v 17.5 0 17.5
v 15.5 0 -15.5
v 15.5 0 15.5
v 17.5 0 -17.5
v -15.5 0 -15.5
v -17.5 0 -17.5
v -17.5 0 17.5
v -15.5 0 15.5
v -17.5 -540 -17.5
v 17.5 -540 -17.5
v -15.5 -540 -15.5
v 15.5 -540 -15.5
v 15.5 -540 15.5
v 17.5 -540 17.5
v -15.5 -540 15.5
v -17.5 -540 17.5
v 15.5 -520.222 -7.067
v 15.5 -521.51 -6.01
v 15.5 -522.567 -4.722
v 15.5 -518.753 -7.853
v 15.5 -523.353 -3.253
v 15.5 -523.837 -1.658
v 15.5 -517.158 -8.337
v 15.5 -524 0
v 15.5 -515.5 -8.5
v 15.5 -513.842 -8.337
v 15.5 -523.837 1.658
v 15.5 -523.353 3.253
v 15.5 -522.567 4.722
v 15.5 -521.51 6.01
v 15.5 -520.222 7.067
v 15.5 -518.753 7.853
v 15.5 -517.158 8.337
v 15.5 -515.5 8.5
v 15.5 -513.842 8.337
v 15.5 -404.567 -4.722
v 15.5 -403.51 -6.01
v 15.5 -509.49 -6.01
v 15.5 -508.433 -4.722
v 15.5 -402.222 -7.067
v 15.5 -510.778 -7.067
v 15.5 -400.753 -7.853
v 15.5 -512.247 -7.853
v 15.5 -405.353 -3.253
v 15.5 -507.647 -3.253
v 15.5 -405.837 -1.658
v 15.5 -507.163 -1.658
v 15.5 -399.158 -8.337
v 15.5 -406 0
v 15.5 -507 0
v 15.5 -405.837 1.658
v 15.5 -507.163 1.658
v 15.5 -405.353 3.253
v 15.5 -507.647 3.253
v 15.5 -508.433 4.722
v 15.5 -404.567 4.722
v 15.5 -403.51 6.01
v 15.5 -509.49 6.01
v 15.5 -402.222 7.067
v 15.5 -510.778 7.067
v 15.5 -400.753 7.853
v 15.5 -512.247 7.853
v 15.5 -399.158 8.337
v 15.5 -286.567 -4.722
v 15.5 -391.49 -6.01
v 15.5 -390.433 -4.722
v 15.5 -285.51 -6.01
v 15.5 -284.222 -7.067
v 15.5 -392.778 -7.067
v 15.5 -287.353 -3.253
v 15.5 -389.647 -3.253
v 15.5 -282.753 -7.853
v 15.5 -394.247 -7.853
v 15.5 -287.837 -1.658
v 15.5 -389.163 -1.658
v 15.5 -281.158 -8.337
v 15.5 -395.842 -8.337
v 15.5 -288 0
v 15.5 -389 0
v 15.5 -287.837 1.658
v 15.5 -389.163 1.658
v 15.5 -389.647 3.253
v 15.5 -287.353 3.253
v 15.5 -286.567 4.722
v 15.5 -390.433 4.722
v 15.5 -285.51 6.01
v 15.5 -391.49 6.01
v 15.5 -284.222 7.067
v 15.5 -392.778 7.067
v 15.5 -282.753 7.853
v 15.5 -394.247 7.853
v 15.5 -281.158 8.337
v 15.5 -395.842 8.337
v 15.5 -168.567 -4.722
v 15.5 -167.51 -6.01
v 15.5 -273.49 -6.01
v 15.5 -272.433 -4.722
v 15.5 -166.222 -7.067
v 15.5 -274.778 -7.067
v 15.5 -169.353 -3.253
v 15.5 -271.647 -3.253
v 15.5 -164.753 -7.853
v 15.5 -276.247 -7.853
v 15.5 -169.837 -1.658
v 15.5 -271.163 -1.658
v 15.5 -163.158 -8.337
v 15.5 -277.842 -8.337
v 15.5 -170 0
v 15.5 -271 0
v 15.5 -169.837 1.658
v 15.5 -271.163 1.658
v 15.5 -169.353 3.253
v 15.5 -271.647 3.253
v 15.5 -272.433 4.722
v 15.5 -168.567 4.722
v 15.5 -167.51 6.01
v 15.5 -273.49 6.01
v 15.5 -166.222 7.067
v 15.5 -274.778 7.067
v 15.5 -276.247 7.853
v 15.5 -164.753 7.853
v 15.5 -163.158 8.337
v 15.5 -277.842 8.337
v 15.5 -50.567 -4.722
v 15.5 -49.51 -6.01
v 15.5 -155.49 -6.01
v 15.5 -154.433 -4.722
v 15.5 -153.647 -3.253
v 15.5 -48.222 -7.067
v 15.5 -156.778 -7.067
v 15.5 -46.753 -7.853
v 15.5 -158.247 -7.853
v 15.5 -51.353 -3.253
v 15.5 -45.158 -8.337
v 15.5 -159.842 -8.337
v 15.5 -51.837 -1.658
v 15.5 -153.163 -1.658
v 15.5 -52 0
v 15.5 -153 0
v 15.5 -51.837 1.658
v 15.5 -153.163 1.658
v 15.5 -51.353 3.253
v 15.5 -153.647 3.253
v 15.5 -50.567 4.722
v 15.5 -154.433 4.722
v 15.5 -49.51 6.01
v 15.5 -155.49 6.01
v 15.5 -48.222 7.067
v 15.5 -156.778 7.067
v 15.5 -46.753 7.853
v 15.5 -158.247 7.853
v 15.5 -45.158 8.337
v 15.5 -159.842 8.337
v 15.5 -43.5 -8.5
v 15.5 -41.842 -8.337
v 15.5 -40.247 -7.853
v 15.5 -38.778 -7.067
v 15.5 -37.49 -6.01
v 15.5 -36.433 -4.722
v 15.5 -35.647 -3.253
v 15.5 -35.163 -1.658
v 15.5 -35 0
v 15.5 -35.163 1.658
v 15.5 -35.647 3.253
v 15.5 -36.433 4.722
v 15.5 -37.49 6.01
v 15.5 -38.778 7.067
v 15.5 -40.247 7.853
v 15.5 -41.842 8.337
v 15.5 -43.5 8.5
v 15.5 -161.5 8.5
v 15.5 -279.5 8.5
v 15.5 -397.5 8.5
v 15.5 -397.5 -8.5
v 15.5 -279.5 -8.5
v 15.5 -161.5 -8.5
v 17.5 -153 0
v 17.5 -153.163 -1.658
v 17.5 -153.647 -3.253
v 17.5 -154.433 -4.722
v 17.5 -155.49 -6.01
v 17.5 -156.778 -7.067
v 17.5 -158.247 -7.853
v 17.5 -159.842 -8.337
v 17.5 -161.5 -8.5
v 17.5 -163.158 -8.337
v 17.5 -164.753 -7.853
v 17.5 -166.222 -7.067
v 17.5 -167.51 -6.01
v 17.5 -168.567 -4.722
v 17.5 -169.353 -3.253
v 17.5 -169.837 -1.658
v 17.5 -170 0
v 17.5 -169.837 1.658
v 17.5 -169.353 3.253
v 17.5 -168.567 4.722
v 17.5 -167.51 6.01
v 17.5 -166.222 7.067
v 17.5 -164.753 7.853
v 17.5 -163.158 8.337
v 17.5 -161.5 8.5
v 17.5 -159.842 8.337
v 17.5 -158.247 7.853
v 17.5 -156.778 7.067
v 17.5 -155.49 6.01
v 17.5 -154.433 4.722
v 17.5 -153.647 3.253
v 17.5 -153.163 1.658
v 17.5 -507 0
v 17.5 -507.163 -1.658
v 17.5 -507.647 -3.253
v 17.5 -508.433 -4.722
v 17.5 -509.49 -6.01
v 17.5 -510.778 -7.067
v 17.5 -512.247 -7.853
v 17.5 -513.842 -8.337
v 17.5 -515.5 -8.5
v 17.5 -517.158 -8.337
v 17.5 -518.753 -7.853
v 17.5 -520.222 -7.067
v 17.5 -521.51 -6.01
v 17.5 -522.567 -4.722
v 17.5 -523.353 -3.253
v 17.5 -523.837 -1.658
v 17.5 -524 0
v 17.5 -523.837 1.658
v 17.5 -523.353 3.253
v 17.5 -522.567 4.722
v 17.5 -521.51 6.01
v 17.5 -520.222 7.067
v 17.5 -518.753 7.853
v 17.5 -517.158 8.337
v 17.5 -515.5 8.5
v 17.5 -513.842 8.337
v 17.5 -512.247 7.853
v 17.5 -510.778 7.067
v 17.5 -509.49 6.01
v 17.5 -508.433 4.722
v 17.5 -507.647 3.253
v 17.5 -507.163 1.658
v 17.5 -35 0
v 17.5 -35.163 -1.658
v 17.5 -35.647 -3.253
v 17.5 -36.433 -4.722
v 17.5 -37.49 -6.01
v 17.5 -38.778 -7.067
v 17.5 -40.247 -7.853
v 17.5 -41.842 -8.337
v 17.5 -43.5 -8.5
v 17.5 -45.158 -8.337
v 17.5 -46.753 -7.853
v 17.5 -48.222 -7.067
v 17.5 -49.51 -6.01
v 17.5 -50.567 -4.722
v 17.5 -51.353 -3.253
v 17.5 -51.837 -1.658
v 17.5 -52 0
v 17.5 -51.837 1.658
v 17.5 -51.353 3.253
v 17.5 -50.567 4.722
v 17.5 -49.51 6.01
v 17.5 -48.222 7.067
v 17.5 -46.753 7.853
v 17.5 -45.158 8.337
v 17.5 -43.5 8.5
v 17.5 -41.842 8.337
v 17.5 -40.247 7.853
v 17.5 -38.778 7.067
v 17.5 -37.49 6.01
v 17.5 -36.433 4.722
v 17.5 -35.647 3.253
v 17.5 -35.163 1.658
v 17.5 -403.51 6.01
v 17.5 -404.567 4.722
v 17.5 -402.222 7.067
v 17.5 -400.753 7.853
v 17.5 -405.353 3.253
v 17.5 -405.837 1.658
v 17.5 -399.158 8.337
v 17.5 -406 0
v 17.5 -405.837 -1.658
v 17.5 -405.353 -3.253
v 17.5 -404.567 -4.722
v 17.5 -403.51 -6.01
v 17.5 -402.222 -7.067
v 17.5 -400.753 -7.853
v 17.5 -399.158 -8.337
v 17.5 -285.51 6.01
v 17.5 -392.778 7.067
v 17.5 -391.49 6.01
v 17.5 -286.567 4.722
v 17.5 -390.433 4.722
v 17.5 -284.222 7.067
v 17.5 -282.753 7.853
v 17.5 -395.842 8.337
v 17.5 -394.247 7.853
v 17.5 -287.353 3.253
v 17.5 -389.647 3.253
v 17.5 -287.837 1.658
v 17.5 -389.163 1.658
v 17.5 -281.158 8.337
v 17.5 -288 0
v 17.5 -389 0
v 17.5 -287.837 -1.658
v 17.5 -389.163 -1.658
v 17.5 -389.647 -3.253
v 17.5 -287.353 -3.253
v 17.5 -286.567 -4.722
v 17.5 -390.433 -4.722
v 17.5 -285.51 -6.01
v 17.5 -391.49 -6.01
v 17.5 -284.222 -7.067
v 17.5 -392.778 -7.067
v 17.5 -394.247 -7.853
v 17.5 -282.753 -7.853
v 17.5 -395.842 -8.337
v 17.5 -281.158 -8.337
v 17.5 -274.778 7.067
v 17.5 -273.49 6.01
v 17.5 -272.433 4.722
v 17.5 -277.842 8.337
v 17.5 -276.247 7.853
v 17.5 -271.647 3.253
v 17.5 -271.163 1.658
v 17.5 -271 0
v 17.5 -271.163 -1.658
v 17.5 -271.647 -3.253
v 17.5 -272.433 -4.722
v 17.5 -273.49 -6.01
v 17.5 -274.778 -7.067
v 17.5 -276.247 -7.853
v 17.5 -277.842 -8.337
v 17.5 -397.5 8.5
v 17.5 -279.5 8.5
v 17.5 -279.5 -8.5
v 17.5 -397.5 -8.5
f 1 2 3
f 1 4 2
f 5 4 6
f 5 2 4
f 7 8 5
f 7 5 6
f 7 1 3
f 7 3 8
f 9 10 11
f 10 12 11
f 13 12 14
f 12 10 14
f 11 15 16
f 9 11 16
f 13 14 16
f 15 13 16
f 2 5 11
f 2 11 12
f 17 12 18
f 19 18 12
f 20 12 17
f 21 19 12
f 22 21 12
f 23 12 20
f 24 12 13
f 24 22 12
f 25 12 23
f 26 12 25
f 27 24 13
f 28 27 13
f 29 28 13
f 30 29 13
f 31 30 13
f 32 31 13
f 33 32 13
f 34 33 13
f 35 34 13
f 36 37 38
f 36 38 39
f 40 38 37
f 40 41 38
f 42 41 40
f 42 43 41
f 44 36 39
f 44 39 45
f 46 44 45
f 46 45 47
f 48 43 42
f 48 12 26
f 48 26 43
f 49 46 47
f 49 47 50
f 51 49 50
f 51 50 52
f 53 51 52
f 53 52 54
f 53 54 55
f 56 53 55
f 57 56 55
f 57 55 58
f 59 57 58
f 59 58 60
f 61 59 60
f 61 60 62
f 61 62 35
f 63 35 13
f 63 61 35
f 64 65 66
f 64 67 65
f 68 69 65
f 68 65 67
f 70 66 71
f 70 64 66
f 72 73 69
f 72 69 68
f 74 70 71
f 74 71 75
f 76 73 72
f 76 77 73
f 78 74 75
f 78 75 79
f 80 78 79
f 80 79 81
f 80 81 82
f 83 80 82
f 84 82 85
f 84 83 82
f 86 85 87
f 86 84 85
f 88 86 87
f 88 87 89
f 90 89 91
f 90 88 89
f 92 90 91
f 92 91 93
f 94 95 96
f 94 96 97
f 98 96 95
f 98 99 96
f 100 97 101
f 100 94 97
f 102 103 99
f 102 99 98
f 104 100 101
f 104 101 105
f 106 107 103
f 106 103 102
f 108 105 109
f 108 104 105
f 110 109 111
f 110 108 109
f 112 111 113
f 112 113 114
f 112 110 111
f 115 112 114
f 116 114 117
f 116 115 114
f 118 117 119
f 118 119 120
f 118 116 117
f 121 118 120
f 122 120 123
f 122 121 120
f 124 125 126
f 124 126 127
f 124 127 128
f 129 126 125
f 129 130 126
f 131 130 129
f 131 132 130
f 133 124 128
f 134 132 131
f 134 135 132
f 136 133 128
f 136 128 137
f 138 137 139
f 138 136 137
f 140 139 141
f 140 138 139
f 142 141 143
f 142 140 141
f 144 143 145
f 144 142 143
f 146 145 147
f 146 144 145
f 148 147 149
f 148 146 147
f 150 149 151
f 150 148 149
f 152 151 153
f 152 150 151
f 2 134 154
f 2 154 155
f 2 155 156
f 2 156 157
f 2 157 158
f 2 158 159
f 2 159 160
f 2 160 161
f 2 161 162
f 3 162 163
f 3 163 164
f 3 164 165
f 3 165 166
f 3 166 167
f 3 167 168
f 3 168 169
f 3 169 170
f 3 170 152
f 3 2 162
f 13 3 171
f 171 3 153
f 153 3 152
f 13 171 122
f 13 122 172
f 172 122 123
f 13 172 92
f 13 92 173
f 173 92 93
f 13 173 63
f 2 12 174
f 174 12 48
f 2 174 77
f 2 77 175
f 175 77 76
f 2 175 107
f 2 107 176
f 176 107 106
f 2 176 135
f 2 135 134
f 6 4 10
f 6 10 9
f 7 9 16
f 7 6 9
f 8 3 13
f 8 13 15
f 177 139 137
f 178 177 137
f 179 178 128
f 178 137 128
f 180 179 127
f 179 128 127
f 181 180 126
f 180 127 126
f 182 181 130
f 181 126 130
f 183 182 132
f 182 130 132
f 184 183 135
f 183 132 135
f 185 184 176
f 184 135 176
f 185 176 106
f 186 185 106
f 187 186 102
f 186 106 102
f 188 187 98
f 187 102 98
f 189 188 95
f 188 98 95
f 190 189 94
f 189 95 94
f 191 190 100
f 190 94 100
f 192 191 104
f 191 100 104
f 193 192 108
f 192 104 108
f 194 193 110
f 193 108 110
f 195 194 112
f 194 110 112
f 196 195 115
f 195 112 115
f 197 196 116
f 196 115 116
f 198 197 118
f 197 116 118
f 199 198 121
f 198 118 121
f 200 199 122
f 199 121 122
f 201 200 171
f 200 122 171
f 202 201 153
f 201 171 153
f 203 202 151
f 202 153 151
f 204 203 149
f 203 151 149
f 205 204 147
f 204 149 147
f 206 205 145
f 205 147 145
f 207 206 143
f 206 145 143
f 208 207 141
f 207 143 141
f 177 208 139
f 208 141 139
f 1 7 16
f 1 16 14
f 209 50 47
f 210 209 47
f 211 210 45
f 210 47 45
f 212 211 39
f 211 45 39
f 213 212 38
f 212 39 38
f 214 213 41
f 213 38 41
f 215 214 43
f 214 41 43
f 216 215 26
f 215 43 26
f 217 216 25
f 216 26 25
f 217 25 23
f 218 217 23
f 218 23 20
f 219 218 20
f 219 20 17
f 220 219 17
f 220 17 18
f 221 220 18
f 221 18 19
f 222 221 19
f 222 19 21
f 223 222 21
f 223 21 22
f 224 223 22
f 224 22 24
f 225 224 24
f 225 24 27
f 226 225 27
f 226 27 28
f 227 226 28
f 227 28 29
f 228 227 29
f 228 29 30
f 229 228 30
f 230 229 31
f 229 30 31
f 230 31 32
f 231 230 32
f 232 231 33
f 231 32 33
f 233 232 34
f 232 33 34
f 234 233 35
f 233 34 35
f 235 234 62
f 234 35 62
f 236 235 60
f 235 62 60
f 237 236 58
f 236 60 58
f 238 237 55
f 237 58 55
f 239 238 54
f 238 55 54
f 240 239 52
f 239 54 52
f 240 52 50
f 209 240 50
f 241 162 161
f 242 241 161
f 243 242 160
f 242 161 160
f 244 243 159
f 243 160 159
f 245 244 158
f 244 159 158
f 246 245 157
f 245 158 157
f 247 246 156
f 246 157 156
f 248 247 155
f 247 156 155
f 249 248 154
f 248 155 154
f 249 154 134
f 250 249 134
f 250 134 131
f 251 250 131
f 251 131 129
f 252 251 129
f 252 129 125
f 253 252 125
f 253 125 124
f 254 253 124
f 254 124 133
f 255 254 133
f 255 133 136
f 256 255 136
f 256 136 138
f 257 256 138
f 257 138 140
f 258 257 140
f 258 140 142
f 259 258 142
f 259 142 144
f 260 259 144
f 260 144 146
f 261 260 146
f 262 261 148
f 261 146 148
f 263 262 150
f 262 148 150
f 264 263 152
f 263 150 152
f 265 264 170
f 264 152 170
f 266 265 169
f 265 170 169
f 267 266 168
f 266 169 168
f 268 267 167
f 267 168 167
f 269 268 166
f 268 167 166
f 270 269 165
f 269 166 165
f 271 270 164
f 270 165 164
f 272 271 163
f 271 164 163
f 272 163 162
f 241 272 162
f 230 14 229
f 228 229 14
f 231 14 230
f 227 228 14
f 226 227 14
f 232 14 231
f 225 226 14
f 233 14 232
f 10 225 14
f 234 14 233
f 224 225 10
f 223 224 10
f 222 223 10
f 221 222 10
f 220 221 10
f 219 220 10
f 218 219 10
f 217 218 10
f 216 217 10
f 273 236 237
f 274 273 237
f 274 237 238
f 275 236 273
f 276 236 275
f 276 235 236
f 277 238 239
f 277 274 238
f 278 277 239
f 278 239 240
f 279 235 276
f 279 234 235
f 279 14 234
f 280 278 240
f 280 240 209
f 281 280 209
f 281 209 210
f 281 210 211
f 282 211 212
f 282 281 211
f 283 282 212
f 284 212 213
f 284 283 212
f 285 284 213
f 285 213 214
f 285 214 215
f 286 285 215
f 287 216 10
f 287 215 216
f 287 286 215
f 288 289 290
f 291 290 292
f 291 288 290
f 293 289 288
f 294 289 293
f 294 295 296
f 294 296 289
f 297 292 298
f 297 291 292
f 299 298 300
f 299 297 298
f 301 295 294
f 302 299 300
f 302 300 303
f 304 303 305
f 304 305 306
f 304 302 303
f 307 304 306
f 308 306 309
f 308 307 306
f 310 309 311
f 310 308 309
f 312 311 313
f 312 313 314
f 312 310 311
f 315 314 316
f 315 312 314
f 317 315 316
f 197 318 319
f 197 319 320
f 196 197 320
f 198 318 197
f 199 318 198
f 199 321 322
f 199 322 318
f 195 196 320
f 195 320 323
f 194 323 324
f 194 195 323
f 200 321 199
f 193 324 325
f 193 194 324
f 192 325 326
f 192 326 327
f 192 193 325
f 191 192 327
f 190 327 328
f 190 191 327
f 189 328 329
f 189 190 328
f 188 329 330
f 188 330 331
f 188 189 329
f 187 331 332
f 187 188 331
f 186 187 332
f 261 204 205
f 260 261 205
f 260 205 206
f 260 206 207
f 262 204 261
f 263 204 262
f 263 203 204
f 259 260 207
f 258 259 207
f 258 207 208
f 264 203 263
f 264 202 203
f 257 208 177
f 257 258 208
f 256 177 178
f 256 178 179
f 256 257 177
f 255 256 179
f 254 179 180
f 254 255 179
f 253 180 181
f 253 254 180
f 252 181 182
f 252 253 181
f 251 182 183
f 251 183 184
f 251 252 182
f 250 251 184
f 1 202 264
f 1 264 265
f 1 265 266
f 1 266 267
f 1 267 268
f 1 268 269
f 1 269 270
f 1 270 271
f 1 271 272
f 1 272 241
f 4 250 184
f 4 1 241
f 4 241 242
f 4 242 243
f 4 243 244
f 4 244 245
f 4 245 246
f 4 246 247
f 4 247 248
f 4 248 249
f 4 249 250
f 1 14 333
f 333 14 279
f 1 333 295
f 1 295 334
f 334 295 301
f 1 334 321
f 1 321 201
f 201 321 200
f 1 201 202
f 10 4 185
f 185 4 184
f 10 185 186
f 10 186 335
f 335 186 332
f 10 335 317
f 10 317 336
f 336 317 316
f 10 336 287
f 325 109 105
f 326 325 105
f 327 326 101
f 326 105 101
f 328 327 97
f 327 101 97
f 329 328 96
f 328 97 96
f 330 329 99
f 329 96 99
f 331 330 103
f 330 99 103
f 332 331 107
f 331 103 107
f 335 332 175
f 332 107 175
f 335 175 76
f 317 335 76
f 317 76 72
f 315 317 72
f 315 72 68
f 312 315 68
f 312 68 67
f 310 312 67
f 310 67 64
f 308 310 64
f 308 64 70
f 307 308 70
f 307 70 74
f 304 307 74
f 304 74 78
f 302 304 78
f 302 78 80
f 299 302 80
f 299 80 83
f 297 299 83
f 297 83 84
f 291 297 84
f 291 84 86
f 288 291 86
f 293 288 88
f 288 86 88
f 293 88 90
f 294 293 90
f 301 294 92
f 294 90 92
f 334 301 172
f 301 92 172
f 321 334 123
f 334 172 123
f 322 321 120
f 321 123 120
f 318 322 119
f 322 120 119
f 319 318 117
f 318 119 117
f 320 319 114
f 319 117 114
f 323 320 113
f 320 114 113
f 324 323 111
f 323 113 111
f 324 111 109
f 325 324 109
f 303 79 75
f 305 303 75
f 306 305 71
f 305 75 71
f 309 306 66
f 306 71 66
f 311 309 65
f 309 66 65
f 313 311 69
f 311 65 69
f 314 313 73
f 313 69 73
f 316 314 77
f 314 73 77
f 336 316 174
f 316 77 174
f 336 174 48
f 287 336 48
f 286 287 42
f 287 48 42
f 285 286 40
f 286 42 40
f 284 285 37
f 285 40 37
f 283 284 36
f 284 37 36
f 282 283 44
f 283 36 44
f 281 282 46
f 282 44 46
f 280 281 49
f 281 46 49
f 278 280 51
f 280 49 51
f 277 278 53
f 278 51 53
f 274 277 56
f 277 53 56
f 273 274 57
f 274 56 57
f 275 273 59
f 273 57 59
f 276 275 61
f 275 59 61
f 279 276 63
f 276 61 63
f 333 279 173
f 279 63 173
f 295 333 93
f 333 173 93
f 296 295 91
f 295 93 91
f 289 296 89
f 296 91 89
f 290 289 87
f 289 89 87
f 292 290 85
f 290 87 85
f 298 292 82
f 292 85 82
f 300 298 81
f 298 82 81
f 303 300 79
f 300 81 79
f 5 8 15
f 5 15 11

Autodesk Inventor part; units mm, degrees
ref_plane "YZ Plane" through (0, 0, 0) normal (1, 0, 0) x (0, 1, 0)
ref_plane "XZ Plane" through (0, 0, 0) normal (0, 1, 0) x (-1, 0, 0)
ref_plane "XY Plane" through (0, 0, 0) normal (0, 0, 1) x (1, 0, 0)
sketch "Sketch9" plane through (0, 0, 0) normal (0, 1, 0) x (-1, 0, 0)
  line L0 (17.5, 17.5) -> (-17.5, 17.5)
  line L1 (-17.5, 17.5) -> (-17.5, -17.5)
  line L2 (-17.5, -17.5) -> (17.5, -17.5)
  line L3 (17.5, -17.5) -> (17.5, 17.5)
  line L4 (17.5, 17.5) -> (-17.5, -17.5) construction
  line L5 (-17.5, 17.5) -> (17.5, -17.5) construction
  line L6 (-15.5, 15.5) -> (15.5, 15.5)
  line L7 (15.5, 15.5) -> (15.5, -15.5)
  line L8 (15.5, -15.5) -> (-15.5, -15.5)
  line L9 (-15.5, -15.5) -> (-15.5, 15.5)
  point P0 (0, 0)
  dimension "d172" = 35
  dimension "d173" = 35
  dimension "d174" = 2
extrude "Extrusion3" add sketch "Sketch9" against normal blind 540
sketch "Sketch10" plane through (0, 0, 0) normal (1, 0, 0) x (0, 1, 0)
  line L0 (0, 17.5) -> (0, -17.5) construction
  line L1 (0, 17.5) -> (-540, 17.5) construction
  line L2 (-540, -17.5) -> (-540, 17.5) construction
  line L3 (0, -17.5) -> (-540, -17.5) construction
  line L4 (-524, 8.5) -> (-507, 8.5)
  line L5 (-507, 8.5) -> (-507, -8.5)
  line L6 (-507, -8.5) -> (-524, -8.5)
  line L7 (-524, -8.5) -> (-524, 8.5)
  line L8 (-524, 8.5) -> (-507, -8.5) construction
  line L9 (-507, 8.5) -> (-524, -8.5) construction
  circle A0 centre (-515.5, 0) radius 8.5
  line L10 (0, 17.5) -> (0, -17.5) projected
  point P0 (0, 0)
  point P1 (0, 0)
  point P2 (-540, 0)
  dimension "d177" = 17
  dimension "d178" = 17
  dimension "d191" = 16
extrude "Extrusion4" cut sketch "Sketch10" along normal through all contours A0
pattern_linear "Rectangular Pattern4" count 5 spacing 118 along (0, 1, 0) of "Extrusion4"
properties part number "ANP 1434 FDS WAY tube4" material "Stainless Steel"
